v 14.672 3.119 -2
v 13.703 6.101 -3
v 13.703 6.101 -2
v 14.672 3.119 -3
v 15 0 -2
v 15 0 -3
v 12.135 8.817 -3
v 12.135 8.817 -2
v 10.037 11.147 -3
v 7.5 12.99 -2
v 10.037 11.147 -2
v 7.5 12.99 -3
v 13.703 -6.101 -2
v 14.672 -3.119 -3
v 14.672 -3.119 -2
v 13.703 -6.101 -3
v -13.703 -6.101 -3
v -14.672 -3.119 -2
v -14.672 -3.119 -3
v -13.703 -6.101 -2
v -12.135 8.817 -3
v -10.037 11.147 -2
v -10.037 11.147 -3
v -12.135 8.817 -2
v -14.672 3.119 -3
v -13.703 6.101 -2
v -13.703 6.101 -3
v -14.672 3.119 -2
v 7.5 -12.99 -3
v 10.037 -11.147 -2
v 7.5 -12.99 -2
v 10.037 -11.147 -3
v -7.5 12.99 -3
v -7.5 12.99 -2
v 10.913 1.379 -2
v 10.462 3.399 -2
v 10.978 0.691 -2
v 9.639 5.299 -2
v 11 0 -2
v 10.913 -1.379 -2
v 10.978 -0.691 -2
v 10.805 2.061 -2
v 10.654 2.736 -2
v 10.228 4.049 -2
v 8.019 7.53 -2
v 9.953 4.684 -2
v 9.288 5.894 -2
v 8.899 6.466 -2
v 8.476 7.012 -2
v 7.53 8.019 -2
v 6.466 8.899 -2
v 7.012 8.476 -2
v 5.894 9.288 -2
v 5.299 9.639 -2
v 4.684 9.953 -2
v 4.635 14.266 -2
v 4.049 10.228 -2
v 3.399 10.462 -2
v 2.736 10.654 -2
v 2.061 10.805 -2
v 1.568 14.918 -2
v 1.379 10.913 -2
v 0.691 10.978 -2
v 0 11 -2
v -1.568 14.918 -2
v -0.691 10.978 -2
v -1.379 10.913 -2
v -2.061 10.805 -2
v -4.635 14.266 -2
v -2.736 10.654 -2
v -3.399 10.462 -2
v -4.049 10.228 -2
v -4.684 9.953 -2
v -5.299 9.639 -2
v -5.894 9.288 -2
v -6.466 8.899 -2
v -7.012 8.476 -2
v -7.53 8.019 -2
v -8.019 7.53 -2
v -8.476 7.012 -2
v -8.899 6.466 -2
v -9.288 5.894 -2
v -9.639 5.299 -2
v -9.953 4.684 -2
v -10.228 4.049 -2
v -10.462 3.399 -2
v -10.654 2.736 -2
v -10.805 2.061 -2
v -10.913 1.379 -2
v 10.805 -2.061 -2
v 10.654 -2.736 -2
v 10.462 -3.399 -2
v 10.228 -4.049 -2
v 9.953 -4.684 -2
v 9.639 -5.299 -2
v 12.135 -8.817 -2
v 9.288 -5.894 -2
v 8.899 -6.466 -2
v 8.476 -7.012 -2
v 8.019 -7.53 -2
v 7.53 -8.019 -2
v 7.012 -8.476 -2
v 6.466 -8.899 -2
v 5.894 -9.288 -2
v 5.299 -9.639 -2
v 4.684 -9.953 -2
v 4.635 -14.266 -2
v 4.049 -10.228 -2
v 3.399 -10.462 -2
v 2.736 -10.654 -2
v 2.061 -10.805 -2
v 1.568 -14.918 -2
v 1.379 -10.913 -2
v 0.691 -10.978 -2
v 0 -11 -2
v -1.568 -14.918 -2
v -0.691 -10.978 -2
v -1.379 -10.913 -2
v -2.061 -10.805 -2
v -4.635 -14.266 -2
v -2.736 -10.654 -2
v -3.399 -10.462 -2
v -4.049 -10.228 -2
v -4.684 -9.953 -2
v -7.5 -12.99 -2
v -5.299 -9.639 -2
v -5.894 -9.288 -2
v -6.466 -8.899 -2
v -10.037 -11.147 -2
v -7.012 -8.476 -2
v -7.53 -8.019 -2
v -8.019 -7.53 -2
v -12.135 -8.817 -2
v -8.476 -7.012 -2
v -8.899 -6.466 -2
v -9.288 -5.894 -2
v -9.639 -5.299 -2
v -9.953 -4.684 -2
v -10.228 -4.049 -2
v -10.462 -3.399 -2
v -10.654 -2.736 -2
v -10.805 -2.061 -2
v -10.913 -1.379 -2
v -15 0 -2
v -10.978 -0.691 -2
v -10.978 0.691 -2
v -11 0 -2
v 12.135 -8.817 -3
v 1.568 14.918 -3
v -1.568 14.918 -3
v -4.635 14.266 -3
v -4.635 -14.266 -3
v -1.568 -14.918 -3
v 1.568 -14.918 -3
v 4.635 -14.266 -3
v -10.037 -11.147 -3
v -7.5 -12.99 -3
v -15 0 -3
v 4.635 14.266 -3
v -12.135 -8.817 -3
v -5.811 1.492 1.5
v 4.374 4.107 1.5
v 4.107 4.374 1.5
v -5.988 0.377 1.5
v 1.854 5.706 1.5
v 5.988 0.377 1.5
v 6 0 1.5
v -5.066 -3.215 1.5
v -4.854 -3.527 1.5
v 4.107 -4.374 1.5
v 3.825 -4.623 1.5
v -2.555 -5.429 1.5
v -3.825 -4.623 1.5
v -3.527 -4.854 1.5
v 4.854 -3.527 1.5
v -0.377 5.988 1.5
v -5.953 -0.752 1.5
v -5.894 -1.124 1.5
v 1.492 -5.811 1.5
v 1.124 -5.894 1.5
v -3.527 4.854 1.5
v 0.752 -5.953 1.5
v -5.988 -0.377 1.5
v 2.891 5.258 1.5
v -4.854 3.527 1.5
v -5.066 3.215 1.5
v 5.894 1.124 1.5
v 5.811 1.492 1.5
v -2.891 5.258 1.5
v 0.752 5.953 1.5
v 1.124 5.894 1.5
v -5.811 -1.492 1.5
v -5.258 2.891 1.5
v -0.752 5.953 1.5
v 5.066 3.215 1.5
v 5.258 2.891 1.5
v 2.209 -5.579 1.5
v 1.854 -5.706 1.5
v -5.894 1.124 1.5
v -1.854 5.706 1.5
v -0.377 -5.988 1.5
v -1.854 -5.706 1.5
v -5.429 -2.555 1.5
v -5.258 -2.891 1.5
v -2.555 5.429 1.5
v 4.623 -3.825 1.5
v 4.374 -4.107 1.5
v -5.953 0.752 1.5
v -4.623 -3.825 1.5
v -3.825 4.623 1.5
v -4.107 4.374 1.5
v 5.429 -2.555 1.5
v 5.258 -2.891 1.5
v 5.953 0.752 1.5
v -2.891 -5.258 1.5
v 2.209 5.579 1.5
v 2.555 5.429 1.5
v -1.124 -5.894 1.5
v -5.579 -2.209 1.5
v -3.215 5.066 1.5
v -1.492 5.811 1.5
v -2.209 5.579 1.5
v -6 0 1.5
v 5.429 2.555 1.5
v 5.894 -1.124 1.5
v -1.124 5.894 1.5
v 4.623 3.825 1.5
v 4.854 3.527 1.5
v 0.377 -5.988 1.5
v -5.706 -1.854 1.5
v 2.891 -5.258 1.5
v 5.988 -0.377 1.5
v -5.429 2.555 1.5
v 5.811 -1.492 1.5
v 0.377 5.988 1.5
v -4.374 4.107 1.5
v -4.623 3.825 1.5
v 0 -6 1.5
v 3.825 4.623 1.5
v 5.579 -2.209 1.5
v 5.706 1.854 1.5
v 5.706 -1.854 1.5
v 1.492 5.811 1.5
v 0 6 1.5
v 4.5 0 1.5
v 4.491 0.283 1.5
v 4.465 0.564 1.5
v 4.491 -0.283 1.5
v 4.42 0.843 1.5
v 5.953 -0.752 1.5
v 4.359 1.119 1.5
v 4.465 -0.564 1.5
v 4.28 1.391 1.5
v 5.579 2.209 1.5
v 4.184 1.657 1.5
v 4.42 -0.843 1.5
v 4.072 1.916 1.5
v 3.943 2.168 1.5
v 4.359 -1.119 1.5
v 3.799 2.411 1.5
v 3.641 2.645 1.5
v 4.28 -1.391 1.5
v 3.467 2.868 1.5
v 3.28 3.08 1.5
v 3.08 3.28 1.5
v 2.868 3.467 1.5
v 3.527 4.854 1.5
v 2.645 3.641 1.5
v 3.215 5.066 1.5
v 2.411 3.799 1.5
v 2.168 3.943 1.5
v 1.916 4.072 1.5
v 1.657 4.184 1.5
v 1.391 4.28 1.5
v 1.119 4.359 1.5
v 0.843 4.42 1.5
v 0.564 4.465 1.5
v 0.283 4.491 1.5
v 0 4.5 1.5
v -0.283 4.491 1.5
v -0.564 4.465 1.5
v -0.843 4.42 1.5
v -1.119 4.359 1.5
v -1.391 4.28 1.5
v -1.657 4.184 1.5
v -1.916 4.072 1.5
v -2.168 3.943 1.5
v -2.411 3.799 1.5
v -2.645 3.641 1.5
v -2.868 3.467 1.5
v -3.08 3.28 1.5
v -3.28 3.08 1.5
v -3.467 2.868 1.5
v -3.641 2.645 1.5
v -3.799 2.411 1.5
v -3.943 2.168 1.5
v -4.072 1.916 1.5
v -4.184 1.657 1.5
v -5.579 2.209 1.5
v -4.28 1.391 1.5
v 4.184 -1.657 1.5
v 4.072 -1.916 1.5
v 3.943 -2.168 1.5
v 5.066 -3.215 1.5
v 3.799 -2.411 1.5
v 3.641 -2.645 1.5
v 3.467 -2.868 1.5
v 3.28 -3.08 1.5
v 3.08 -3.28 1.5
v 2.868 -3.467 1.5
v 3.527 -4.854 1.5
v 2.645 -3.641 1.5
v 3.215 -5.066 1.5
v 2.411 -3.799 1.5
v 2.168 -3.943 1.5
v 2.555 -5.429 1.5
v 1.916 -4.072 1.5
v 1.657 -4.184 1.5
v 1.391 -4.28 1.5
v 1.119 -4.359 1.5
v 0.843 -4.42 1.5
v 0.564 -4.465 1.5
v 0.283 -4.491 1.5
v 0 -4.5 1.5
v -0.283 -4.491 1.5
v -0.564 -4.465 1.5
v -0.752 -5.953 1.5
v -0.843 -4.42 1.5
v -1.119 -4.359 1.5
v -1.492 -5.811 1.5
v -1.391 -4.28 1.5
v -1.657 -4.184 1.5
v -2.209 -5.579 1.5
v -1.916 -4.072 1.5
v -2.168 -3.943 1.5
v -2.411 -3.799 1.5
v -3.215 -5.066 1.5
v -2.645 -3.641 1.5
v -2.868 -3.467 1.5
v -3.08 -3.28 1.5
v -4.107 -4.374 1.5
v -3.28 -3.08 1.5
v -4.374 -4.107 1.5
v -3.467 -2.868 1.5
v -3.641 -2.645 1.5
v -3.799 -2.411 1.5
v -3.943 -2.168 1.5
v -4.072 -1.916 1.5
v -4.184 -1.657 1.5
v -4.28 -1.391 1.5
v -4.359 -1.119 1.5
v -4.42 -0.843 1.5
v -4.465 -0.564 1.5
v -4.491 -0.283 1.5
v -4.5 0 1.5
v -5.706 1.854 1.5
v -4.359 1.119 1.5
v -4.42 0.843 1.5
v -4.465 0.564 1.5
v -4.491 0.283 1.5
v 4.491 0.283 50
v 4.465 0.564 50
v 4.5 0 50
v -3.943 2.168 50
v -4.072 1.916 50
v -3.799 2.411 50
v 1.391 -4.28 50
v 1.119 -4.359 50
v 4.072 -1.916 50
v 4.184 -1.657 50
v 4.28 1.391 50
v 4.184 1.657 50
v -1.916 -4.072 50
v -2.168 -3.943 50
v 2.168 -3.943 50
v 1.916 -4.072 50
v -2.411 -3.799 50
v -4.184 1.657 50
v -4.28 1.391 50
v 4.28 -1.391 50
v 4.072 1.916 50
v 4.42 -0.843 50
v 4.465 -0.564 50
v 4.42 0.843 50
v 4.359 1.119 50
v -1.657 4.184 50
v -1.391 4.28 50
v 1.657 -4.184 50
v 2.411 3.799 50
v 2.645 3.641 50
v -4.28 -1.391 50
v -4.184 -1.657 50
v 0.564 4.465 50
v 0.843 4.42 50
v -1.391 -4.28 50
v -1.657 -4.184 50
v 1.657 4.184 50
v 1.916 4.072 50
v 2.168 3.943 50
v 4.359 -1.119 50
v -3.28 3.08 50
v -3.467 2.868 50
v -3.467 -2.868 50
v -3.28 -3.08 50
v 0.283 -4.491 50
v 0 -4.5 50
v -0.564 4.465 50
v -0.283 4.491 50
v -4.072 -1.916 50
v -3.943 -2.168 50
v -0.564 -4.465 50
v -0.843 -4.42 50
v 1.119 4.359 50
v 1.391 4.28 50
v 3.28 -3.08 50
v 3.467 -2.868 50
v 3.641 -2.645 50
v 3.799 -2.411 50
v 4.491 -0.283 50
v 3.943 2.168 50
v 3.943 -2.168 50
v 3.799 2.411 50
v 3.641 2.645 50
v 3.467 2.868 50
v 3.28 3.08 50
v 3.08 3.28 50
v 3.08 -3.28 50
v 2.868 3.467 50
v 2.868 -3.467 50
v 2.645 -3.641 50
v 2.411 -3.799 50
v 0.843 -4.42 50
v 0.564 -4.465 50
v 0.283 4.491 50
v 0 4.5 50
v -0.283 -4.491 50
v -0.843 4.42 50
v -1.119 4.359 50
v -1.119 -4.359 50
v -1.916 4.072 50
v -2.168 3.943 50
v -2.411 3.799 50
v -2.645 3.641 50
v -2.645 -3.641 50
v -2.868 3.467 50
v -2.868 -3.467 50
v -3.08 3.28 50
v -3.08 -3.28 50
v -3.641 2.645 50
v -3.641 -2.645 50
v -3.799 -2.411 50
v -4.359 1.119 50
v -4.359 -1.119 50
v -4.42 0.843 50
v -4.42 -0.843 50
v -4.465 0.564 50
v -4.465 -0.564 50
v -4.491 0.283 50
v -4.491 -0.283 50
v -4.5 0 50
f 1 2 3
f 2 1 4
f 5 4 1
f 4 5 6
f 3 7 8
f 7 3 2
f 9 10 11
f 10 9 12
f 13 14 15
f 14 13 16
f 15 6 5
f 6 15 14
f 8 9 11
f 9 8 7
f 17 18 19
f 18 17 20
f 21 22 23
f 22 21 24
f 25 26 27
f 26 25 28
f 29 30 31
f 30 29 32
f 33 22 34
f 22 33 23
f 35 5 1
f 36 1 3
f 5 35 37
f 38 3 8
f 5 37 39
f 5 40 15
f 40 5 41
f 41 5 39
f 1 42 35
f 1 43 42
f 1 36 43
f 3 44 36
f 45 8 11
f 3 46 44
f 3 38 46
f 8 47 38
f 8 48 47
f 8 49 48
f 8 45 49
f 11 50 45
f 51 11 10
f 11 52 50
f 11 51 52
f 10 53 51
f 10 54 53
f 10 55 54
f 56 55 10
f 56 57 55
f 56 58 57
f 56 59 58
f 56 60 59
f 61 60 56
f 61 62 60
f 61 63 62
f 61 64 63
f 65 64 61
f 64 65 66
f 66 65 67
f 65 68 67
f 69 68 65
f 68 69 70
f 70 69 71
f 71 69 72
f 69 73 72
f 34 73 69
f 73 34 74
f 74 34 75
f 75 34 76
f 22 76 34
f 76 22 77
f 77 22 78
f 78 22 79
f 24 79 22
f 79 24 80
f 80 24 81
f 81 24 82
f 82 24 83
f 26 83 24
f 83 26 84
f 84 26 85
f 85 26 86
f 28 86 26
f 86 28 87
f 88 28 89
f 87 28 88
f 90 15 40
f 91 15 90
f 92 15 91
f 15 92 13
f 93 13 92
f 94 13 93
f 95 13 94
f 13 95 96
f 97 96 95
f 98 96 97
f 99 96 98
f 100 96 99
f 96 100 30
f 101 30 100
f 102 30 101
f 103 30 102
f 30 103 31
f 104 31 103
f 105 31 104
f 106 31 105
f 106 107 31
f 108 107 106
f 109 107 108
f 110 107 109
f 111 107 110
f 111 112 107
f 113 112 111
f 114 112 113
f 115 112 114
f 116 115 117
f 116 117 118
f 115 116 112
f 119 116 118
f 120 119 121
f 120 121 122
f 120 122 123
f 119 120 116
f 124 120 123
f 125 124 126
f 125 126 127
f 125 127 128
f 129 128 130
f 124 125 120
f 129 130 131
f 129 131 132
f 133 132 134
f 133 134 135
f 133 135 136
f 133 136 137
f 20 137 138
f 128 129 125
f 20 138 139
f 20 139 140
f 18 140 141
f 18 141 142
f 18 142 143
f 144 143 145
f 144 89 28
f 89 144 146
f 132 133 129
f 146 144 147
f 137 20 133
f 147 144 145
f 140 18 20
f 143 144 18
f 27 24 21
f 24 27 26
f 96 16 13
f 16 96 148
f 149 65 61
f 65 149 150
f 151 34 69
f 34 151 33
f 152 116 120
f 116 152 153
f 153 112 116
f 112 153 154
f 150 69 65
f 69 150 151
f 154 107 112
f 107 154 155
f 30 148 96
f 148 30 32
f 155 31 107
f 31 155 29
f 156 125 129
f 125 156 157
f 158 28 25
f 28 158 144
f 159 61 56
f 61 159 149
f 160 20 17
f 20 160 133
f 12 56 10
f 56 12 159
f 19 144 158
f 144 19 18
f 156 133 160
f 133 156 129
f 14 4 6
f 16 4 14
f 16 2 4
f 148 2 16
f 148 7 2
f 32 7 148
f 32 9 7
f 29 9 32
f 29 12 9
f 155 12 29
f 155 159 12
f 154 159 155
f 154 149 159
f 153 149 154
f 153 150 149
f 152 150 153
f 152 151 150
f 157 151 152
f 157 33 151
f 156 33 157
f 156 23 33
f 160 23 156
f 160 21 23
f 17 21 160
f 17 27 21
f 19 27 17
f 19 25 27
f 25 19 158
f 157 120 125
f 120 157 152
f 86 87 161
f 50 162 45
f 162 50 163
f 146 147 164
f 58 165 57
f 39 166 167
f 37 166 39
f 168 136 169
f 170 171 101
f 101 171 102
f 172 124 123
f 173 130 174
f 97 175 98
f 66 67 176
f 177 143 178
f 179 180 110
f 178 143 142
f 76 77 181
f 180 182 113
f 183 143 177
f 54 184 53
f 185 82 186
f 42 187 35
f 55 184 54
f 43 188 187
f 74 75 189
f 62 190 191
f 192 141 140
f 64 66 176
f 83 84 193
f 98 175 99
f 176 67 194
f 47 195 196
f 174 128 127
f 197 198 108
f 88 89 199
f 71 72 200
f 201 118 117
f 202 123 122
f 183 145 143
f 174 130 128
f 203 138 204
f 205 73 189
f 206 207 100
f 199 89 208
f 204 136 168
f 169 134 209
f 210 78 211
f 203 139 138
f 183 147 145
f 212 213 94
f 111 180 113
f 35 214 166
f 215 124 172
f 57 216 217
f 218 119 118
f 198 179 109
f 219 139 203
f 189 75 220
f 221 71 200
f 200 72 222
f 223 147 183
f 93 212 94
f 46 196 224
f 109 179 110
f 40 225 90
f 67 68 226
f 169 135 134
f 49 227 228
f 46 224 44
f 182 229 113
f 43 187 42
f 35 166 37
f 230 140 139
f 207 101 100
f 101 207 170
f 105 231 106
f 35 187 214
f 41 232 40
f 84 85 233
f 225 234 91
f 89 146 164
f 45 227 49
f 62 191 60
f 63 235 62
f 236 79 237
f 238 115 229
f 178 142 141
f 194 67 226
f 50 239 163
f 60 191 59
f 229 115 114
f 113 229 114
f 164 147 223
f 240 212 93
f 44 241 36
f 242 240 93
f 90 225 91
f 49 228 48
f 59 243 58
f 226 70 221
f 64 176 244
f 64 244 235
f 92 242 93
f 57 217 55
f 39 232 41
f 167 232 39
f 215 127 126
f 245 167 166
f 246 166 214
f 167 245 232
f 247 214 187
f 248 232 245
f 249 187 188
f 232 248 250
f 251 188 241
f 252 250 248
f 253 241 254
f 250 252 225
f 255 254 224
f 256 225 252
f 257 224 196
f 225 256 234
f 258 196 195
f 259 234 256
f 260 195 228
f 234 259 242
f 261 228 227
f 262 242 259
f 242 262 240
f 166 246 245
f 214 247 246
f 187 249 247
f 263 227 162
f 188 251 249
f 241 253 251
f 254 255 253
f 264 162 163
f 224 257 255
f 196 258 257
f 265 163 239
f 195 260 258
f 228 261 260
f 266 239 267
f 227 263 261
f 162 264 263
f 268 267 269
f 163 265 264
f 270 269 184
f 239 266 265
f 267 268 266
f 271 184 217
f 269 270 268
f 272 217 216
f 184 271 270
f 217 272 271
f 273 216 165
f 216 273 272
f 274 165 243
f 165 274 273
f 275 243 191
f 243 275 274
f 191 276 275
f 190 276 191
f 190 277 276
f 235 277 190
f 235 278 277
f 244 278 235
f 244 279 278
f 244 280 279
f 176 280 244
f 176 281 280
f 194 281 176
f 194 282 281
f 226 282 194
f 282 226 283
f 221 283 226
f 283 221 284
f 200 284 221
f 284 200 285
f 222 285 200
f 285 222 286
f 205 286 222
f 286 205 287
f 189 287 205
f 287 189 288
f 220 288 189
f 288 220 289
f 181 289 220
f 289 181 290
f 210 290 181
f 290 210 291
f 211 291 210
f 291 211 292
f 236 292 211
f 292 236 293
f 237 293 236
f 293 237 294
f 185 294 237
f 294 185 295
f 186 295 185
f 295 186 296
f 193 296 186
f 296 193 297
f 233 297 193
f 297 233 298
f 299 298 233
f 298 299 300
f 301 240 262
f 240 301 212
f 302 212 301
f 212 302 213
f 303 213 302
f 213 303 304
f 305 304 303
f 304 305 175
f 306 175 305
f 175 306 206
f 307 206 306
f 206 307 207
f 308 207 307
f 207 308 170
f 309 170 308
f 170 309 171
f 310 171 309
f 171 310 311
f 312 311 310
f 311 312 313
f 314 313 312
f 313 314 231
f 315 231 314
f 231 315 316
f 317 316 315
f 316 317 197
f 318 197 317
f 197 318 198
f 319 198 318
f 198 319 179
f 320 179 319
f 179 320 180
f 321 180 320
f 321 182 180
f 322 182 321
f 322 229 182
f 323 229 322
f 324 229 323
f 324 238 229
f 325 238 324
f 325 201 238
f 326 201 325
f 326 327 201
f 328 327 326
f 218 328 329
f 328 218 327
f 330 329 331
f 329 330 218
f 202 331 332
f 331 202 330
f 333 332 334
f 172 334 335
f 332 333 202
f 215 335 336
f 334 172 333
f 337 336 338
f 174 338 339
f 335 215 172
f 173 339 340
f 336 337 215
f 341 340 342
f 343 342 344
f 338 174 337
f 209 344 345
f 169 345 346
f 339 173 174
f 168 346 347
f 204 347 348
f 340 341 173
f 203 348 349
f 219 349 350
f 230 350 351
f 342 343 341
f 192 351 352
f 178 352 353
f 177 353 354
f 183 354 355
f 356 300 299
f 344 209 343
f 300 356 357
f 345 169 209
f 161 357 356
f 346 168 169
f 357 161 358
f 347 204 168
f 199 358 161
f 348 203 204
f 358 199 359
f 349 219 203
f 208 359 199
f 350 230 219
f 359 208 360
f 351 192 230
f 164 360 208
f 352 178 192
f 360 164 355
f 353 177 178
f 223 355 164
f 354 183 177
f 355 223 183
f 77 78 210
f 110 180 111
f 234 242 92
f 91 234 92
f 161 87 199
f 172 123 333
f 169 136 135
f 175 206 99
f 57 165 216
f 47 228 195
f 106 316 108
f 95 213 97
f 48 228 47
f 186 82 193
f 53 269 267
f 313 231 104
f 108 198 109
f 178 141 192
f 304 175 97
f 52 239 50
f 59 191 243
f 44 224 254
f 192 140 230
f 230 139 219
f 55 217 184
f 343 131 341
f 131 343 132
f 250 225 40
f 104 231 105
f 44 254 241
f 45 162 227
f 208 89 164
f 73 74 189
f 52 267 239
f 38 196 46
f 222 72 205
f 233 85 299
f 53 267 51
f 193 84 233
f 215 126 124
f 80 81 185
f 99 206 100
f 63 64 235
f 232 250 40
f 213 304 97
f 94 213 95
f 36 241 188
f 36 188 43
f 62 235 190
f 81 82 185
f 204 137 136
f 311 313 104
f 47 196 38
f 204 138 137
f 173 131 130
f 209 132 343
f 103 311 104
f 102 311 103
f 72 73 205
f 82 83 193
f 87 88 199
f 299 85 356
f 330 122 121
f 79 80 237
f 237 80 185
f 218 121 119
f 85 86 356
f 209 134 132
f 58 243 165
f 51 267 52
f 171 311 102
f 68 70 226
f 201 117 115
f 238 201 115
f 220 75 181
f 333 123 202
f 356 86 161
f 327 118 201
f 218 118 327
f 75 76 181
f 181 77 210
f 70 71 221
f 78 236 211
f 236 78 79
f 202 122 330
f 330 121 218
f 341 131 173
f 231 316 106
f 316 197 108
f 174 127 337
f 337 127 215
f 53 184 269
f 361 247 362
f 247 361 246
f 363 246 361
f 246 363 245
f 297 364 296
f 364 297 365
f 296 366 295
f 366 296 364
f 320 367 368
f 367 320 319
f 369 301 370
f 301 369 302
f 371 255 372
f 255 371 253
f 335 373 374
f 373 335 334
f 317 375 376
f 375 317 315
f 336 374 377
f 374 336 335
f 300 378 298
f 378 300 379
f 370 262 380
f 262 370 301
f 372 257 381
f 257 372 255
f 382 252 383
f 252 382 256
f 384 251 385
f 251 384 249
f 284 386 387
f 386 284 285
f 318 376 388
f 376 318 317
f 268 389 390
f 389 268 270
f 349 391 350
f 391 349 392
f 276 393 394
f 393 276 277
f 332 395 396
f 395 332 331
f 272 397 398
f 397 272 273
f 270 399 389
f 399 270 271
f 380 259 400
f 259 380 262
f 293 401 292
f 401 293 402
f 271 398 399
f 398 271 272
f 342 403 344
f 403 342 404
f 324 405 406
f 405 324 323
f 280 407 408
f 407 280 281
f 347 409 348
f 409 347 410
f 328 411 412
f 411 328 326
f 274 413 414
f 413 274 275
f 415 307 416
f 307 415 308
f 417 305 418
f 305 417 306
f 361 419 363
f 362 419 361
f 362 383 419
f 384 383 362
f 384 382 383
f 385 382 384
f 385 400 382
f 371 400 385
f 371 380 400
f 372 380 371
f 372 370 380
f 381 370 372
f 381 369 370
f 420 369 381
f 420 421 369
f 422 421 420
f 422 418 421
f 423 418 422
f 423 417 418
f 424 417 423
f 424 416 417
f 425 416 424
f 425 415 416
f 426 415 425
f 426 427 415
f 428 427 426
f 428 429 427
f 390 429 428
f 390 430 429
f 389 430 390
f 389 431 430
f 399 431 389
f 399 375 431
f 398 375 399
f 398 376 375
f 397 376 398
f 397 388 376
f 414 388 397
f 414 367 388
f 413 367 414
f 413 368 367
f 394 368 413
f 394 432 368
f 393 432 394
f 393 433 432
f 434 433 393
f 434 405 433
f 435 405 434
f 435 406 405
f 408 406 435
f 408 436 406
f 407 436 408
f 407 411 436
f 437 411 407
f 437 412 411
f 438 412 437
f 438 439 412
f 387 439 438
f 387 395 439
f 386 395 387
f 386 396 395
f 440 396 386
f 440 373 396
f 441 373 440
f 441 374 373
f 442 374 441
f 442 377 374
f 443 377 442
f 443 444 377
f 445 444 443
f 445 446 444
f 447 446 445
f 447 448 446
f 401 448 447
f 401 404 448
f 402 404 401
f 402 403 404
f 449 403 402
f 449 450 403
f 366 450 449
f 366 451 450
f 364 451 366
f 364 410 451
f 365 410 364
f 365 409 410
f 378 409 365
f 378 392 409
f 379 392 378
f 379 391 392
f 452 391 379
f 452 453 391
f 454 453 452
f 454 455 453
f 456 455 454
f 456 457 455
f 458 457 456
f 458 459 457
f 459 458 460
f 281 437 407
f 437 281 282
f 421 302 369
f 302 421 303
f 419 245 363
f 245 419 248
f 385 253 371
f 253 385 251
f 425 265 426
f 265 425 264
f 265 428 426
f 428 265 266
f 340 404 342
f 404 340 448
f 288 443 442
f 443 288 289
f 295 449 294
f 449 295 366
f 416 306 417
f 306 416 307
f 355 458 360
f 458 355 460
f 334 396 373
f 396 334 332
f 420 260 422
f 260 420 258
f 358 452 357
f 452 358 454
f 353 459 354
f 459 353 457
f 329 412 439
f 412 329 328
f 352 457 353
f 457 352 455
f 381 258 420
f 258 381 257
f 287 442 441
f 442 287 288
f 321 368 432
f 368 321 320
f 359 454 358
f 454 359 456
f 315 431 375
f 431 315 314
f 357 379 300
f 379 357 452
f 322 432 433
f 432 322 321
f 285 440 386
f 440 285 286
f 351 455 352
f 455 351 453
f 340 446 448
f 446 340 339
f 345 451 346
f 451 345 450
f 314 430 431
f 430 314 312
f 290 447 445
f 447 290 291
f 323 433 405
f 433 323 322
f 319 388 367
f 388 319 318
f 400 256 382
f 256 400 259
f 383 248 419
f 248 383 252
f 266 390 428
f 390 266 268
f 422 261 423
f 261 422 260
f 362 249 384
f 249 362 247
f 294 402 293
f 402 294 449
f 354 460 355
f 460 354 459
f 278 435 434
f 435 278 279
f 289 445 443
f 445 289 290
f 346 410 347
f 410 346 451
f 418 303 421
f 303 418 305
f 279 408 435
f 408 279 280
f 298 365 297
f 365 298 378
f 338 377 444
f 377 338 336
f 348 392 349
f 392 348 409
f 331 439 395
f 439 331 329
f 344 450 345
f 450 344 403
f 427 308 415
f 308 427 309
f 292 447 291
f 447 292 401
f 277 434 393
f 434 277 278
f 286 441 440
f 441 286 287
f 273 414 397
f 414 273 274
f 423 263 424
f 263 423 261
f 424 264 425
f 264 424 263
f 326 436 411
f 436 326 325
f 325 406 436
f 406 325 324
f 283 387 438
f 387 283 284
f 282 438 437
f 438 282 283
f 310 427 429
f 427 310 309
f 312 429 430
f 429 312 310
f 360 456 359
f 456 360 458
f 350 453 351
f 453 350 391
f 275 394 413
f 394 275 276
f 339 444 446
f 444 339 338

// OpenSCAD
// file: threads.scad
/*
 * Dan Kirshner - dan_kirshner@yahoo.com
 *
 * You are welcome to make free use of this software.  Retention of my
 * authorship credit would be appreciated.
 *
 * Version 1.4.  2014-10-17   Use "faces" instead of "triangles" for polyhedron
 * Version 1.3.  2013-12-01   Correct loop over turns -- don't have early cut-off
 * Version 1.2.  2012-09-09   Use discrete polyhedra rather than linear_extrude()
 * Version 1.1.  2012-09-07   Corrected to right-hand threads!
 */

// Examples:
metric_thread(8, 1, 4);
//english_thread(1/4, 20, 1);

// Rohloff hub thread:
//metric_thread(34, 1, 10, internal=true, n_starts=6);



// ----------------------------------------------------------------------------
function segments(diameter) = min(50, ceil(diameter*6));


// ----------------------------------------------------------------------------
// internal - true = clearances for internal thread (e.g., a nut).
//            false = clearances for external thread (e.g., a bolt).
//            (Internal threads should be "cut out" from a solid using
//            difference()).
// n_starts - Number of thread starts (e.g., DNA, a "double helix," has
//            n_starts=2).  See wikipedia Screw_thread.
module metric_thread(diameter=8, pitch=1, length=1, internal=false, n_starts=1)
{
   // Number of turns needed.
   n_turns = floor(length/pitch);
   n_segments = segments(diameter);
   h = pitch * cos(30);

   union() {
      intersection() {
         // Start one below z = 0.  Gives an extra turn at each end.
         for (i=[-1*n_starts : n_turns+1]) {
            translate([0, 0, i*pitch]) {
               metric_thread_turn(diameter, pitch, internal, n_starts);
            }
         }

         // Cut to length.
         translate([0, 0, length/2]) {
            cube([diameter*1.1, diameter*1.1, length], center=true);
         }
      }

      // Solid center, including Dmin truncation.
      if (internal) {
         cylinder(r=diameter/2 - h*5/8, h=length, $fn=n_segments);
      } else {

         // External thread includes additional relief.
         cylinder(r=diameter/2 - h*5.3/8, h=length, $fn=n_segments);
      }
   }
}


// ----------------------------------------------------------------------------
// Input units in inches.
// Note: units of measure in drawing are mm!
module english_thread(diameter=0.25, threads_per_inch=20, length=1,
                      internal=false, n_starts=1)
{
   // Convert to mm.
   mm_diameter = diameter*25.4;
   mm_pitch = (1.0/threads_per_inch)*25.4;
   mm_length = length*25.4;

   echo(str("mm_diameter: ", mm_diameter));
   echo(str("mm_pitch: ", mm_pitch));
   echo(str("mm_length: ", mm_length));
   metric_thread(mm_diameter, mm_pitch, mm_length, internal, n_starts);
}


// ----------------------------------------------------------------------------
module metric_thread_turn(diameter, pitch, internal, n_starts)
{
   n_segments = segments(diameter);
   fraction_circle = 1.0/n_segments;
   for (i=[0 : n_segments-1]) {
      rotate([0, 0, i*360*fraction_circle]) {
         translate([0, 0, i*n_starts*pitch*fraction_circle]) {
            thread_polyhedron(diameter/2, pitch, internal, n_starts);
         }
      }
   }
}


// ----------------------------------------------------------------------------
// z (see diagram) as function of current radius.
// (Only good for first half-pitch.)
function z_fct(current_radius, radius, pitch)
   = 0.5*(current_radius - (radius - 0.875*pitch*cos(30)))
                                                       /cos(30);

// ----------------------------------------------------------------------------
module thread_polyhedron(radius, pitch, internal, n_starts)
{
   n_segments = segments(radius*2);
   fraction_circle = 1.0/n_segments;

   h = pitch * cos(30);
   outer_r = radius + (internal ? h/20 : 0); // Adds internal relief.
   //echo(str("outer_r: ", outer_r));


   inner_r = radius - 0.875*h; // Does NOT do Dmin_truncation - do later with
                               // cylinder.

   // Make these just slightly bigger (keep in proportion) so polyhedra will
   // overlap.
   x_incr_outer = outer_r * fraction_circle * 2 * PI * 1.005;
   x_incr_inner = inner_r * fraction_circle * 2 * PI * 1.005;
   z_incr = n_starts * pitch * fraction_circle * 1.005;

   /*    
    (angles x0 and x3 inner are actually 60 deg)

                          /\  (x2_inner, z2_inner) [2]
                         /  \
   (x3_inner, z3_inner) /    \
                  [3]   \     \
                        |\     \ (x2_outer, z2_outer) [6]
                        | \    /
                        |  \  /|
             z          |[7]\/ / (x1_outer, z1_outer) [5]
             |          |   | /
             |   x      |   |/
             |  /       |   / (x0_outer, z0_outer) [4]
             | /        |  /     (behind: (x1_inner, z1_inner) [1]
             |/         | /
    y________|          |/
   (r)                  / (x0_inner, z0_inner) [0]

   */

   x1_outer = outer_r * fraction_circle * 2 * PI;

   z0_outer = z_fct(outer_r, radius, pitch);
   //echo(str("z0_outer: ", z0_outer));

   //polygon([[inner_r, 0], [outer_r, z0_outer], 
   //        [outer_r, 0.5*pitch], [inner_r, 0.5*pitch]]);
   z1_outer = z0_outer + z_incr;

   // Rule for face ordering: look at polyhedron from outside: points must
   // be in clockwise order.
   polyhedron(
      points = [
                [-x_incr_inner/2, -inner_r, 0],                        // [0]
                [x_incr_inner/2, -inner_r, z_incr],                    // [1]
                [x_incr_inner/2, -inner_r, pitch + z_incr],            // [2]
                [-x_incr_inner/2, -inner_r, pitch],                    // [3]

                [-x_incr_outer/2, -outer_r, z0_outer],                 // [4]
                [x_incr_outer/2, -outer_r, z0_outer + z_incr],         // [5]
                [x_incr_outer/2, -outer_r, pitch - z0_outer + z_incr], // [6]
                [-x_incr_outer/2, -outer_r, pitch - z0_outer]          // [7]
               ],

      faces = [
                [0, 3, 7, 4],  // This-side trapezoid

                [1, 5, 6, 2],  // Back-side trapezoid

                [0, 1, 2, 3],  // Inner rectangle

                [4, 7, 6, 5],  // Outer rectangle

                // These are not planar, so do with separate triangles.
                [7, 2, 6],     // Upper rectangle, bottom
                [7, 3, 2],     // Upper rectangle, top

                [0, 5, 1],     // Lower rectangle, bottom
                [0, 4, 5]      // Lower rectangle, top
               ]
   );
}
// main file
use <threads.scad>

module levelingFeet(){
	//metric_thread(9, 1, 50);

	cylinder(r=4.5, h=50, $fn=100)
	
difference(){
	
	translate([0,0,50], $fn=100)
		cylinder(r=4, h=6);

	translate([0,-10,54])
		cube ([1,20,3]);
}

module pad(){
	
difference(){

	cylinder(r=15, h=1);

	translate([0,0,-1])
		cylinder(r=11, h=3);
}

	translate([0,0,1])
		cylinder(h=3.5, r1=11, r2=6, $fn=100);

	cylinder(h=1, r=11);
}

	translate([0,0,-3])
		pad();
}

levelingFeet();
